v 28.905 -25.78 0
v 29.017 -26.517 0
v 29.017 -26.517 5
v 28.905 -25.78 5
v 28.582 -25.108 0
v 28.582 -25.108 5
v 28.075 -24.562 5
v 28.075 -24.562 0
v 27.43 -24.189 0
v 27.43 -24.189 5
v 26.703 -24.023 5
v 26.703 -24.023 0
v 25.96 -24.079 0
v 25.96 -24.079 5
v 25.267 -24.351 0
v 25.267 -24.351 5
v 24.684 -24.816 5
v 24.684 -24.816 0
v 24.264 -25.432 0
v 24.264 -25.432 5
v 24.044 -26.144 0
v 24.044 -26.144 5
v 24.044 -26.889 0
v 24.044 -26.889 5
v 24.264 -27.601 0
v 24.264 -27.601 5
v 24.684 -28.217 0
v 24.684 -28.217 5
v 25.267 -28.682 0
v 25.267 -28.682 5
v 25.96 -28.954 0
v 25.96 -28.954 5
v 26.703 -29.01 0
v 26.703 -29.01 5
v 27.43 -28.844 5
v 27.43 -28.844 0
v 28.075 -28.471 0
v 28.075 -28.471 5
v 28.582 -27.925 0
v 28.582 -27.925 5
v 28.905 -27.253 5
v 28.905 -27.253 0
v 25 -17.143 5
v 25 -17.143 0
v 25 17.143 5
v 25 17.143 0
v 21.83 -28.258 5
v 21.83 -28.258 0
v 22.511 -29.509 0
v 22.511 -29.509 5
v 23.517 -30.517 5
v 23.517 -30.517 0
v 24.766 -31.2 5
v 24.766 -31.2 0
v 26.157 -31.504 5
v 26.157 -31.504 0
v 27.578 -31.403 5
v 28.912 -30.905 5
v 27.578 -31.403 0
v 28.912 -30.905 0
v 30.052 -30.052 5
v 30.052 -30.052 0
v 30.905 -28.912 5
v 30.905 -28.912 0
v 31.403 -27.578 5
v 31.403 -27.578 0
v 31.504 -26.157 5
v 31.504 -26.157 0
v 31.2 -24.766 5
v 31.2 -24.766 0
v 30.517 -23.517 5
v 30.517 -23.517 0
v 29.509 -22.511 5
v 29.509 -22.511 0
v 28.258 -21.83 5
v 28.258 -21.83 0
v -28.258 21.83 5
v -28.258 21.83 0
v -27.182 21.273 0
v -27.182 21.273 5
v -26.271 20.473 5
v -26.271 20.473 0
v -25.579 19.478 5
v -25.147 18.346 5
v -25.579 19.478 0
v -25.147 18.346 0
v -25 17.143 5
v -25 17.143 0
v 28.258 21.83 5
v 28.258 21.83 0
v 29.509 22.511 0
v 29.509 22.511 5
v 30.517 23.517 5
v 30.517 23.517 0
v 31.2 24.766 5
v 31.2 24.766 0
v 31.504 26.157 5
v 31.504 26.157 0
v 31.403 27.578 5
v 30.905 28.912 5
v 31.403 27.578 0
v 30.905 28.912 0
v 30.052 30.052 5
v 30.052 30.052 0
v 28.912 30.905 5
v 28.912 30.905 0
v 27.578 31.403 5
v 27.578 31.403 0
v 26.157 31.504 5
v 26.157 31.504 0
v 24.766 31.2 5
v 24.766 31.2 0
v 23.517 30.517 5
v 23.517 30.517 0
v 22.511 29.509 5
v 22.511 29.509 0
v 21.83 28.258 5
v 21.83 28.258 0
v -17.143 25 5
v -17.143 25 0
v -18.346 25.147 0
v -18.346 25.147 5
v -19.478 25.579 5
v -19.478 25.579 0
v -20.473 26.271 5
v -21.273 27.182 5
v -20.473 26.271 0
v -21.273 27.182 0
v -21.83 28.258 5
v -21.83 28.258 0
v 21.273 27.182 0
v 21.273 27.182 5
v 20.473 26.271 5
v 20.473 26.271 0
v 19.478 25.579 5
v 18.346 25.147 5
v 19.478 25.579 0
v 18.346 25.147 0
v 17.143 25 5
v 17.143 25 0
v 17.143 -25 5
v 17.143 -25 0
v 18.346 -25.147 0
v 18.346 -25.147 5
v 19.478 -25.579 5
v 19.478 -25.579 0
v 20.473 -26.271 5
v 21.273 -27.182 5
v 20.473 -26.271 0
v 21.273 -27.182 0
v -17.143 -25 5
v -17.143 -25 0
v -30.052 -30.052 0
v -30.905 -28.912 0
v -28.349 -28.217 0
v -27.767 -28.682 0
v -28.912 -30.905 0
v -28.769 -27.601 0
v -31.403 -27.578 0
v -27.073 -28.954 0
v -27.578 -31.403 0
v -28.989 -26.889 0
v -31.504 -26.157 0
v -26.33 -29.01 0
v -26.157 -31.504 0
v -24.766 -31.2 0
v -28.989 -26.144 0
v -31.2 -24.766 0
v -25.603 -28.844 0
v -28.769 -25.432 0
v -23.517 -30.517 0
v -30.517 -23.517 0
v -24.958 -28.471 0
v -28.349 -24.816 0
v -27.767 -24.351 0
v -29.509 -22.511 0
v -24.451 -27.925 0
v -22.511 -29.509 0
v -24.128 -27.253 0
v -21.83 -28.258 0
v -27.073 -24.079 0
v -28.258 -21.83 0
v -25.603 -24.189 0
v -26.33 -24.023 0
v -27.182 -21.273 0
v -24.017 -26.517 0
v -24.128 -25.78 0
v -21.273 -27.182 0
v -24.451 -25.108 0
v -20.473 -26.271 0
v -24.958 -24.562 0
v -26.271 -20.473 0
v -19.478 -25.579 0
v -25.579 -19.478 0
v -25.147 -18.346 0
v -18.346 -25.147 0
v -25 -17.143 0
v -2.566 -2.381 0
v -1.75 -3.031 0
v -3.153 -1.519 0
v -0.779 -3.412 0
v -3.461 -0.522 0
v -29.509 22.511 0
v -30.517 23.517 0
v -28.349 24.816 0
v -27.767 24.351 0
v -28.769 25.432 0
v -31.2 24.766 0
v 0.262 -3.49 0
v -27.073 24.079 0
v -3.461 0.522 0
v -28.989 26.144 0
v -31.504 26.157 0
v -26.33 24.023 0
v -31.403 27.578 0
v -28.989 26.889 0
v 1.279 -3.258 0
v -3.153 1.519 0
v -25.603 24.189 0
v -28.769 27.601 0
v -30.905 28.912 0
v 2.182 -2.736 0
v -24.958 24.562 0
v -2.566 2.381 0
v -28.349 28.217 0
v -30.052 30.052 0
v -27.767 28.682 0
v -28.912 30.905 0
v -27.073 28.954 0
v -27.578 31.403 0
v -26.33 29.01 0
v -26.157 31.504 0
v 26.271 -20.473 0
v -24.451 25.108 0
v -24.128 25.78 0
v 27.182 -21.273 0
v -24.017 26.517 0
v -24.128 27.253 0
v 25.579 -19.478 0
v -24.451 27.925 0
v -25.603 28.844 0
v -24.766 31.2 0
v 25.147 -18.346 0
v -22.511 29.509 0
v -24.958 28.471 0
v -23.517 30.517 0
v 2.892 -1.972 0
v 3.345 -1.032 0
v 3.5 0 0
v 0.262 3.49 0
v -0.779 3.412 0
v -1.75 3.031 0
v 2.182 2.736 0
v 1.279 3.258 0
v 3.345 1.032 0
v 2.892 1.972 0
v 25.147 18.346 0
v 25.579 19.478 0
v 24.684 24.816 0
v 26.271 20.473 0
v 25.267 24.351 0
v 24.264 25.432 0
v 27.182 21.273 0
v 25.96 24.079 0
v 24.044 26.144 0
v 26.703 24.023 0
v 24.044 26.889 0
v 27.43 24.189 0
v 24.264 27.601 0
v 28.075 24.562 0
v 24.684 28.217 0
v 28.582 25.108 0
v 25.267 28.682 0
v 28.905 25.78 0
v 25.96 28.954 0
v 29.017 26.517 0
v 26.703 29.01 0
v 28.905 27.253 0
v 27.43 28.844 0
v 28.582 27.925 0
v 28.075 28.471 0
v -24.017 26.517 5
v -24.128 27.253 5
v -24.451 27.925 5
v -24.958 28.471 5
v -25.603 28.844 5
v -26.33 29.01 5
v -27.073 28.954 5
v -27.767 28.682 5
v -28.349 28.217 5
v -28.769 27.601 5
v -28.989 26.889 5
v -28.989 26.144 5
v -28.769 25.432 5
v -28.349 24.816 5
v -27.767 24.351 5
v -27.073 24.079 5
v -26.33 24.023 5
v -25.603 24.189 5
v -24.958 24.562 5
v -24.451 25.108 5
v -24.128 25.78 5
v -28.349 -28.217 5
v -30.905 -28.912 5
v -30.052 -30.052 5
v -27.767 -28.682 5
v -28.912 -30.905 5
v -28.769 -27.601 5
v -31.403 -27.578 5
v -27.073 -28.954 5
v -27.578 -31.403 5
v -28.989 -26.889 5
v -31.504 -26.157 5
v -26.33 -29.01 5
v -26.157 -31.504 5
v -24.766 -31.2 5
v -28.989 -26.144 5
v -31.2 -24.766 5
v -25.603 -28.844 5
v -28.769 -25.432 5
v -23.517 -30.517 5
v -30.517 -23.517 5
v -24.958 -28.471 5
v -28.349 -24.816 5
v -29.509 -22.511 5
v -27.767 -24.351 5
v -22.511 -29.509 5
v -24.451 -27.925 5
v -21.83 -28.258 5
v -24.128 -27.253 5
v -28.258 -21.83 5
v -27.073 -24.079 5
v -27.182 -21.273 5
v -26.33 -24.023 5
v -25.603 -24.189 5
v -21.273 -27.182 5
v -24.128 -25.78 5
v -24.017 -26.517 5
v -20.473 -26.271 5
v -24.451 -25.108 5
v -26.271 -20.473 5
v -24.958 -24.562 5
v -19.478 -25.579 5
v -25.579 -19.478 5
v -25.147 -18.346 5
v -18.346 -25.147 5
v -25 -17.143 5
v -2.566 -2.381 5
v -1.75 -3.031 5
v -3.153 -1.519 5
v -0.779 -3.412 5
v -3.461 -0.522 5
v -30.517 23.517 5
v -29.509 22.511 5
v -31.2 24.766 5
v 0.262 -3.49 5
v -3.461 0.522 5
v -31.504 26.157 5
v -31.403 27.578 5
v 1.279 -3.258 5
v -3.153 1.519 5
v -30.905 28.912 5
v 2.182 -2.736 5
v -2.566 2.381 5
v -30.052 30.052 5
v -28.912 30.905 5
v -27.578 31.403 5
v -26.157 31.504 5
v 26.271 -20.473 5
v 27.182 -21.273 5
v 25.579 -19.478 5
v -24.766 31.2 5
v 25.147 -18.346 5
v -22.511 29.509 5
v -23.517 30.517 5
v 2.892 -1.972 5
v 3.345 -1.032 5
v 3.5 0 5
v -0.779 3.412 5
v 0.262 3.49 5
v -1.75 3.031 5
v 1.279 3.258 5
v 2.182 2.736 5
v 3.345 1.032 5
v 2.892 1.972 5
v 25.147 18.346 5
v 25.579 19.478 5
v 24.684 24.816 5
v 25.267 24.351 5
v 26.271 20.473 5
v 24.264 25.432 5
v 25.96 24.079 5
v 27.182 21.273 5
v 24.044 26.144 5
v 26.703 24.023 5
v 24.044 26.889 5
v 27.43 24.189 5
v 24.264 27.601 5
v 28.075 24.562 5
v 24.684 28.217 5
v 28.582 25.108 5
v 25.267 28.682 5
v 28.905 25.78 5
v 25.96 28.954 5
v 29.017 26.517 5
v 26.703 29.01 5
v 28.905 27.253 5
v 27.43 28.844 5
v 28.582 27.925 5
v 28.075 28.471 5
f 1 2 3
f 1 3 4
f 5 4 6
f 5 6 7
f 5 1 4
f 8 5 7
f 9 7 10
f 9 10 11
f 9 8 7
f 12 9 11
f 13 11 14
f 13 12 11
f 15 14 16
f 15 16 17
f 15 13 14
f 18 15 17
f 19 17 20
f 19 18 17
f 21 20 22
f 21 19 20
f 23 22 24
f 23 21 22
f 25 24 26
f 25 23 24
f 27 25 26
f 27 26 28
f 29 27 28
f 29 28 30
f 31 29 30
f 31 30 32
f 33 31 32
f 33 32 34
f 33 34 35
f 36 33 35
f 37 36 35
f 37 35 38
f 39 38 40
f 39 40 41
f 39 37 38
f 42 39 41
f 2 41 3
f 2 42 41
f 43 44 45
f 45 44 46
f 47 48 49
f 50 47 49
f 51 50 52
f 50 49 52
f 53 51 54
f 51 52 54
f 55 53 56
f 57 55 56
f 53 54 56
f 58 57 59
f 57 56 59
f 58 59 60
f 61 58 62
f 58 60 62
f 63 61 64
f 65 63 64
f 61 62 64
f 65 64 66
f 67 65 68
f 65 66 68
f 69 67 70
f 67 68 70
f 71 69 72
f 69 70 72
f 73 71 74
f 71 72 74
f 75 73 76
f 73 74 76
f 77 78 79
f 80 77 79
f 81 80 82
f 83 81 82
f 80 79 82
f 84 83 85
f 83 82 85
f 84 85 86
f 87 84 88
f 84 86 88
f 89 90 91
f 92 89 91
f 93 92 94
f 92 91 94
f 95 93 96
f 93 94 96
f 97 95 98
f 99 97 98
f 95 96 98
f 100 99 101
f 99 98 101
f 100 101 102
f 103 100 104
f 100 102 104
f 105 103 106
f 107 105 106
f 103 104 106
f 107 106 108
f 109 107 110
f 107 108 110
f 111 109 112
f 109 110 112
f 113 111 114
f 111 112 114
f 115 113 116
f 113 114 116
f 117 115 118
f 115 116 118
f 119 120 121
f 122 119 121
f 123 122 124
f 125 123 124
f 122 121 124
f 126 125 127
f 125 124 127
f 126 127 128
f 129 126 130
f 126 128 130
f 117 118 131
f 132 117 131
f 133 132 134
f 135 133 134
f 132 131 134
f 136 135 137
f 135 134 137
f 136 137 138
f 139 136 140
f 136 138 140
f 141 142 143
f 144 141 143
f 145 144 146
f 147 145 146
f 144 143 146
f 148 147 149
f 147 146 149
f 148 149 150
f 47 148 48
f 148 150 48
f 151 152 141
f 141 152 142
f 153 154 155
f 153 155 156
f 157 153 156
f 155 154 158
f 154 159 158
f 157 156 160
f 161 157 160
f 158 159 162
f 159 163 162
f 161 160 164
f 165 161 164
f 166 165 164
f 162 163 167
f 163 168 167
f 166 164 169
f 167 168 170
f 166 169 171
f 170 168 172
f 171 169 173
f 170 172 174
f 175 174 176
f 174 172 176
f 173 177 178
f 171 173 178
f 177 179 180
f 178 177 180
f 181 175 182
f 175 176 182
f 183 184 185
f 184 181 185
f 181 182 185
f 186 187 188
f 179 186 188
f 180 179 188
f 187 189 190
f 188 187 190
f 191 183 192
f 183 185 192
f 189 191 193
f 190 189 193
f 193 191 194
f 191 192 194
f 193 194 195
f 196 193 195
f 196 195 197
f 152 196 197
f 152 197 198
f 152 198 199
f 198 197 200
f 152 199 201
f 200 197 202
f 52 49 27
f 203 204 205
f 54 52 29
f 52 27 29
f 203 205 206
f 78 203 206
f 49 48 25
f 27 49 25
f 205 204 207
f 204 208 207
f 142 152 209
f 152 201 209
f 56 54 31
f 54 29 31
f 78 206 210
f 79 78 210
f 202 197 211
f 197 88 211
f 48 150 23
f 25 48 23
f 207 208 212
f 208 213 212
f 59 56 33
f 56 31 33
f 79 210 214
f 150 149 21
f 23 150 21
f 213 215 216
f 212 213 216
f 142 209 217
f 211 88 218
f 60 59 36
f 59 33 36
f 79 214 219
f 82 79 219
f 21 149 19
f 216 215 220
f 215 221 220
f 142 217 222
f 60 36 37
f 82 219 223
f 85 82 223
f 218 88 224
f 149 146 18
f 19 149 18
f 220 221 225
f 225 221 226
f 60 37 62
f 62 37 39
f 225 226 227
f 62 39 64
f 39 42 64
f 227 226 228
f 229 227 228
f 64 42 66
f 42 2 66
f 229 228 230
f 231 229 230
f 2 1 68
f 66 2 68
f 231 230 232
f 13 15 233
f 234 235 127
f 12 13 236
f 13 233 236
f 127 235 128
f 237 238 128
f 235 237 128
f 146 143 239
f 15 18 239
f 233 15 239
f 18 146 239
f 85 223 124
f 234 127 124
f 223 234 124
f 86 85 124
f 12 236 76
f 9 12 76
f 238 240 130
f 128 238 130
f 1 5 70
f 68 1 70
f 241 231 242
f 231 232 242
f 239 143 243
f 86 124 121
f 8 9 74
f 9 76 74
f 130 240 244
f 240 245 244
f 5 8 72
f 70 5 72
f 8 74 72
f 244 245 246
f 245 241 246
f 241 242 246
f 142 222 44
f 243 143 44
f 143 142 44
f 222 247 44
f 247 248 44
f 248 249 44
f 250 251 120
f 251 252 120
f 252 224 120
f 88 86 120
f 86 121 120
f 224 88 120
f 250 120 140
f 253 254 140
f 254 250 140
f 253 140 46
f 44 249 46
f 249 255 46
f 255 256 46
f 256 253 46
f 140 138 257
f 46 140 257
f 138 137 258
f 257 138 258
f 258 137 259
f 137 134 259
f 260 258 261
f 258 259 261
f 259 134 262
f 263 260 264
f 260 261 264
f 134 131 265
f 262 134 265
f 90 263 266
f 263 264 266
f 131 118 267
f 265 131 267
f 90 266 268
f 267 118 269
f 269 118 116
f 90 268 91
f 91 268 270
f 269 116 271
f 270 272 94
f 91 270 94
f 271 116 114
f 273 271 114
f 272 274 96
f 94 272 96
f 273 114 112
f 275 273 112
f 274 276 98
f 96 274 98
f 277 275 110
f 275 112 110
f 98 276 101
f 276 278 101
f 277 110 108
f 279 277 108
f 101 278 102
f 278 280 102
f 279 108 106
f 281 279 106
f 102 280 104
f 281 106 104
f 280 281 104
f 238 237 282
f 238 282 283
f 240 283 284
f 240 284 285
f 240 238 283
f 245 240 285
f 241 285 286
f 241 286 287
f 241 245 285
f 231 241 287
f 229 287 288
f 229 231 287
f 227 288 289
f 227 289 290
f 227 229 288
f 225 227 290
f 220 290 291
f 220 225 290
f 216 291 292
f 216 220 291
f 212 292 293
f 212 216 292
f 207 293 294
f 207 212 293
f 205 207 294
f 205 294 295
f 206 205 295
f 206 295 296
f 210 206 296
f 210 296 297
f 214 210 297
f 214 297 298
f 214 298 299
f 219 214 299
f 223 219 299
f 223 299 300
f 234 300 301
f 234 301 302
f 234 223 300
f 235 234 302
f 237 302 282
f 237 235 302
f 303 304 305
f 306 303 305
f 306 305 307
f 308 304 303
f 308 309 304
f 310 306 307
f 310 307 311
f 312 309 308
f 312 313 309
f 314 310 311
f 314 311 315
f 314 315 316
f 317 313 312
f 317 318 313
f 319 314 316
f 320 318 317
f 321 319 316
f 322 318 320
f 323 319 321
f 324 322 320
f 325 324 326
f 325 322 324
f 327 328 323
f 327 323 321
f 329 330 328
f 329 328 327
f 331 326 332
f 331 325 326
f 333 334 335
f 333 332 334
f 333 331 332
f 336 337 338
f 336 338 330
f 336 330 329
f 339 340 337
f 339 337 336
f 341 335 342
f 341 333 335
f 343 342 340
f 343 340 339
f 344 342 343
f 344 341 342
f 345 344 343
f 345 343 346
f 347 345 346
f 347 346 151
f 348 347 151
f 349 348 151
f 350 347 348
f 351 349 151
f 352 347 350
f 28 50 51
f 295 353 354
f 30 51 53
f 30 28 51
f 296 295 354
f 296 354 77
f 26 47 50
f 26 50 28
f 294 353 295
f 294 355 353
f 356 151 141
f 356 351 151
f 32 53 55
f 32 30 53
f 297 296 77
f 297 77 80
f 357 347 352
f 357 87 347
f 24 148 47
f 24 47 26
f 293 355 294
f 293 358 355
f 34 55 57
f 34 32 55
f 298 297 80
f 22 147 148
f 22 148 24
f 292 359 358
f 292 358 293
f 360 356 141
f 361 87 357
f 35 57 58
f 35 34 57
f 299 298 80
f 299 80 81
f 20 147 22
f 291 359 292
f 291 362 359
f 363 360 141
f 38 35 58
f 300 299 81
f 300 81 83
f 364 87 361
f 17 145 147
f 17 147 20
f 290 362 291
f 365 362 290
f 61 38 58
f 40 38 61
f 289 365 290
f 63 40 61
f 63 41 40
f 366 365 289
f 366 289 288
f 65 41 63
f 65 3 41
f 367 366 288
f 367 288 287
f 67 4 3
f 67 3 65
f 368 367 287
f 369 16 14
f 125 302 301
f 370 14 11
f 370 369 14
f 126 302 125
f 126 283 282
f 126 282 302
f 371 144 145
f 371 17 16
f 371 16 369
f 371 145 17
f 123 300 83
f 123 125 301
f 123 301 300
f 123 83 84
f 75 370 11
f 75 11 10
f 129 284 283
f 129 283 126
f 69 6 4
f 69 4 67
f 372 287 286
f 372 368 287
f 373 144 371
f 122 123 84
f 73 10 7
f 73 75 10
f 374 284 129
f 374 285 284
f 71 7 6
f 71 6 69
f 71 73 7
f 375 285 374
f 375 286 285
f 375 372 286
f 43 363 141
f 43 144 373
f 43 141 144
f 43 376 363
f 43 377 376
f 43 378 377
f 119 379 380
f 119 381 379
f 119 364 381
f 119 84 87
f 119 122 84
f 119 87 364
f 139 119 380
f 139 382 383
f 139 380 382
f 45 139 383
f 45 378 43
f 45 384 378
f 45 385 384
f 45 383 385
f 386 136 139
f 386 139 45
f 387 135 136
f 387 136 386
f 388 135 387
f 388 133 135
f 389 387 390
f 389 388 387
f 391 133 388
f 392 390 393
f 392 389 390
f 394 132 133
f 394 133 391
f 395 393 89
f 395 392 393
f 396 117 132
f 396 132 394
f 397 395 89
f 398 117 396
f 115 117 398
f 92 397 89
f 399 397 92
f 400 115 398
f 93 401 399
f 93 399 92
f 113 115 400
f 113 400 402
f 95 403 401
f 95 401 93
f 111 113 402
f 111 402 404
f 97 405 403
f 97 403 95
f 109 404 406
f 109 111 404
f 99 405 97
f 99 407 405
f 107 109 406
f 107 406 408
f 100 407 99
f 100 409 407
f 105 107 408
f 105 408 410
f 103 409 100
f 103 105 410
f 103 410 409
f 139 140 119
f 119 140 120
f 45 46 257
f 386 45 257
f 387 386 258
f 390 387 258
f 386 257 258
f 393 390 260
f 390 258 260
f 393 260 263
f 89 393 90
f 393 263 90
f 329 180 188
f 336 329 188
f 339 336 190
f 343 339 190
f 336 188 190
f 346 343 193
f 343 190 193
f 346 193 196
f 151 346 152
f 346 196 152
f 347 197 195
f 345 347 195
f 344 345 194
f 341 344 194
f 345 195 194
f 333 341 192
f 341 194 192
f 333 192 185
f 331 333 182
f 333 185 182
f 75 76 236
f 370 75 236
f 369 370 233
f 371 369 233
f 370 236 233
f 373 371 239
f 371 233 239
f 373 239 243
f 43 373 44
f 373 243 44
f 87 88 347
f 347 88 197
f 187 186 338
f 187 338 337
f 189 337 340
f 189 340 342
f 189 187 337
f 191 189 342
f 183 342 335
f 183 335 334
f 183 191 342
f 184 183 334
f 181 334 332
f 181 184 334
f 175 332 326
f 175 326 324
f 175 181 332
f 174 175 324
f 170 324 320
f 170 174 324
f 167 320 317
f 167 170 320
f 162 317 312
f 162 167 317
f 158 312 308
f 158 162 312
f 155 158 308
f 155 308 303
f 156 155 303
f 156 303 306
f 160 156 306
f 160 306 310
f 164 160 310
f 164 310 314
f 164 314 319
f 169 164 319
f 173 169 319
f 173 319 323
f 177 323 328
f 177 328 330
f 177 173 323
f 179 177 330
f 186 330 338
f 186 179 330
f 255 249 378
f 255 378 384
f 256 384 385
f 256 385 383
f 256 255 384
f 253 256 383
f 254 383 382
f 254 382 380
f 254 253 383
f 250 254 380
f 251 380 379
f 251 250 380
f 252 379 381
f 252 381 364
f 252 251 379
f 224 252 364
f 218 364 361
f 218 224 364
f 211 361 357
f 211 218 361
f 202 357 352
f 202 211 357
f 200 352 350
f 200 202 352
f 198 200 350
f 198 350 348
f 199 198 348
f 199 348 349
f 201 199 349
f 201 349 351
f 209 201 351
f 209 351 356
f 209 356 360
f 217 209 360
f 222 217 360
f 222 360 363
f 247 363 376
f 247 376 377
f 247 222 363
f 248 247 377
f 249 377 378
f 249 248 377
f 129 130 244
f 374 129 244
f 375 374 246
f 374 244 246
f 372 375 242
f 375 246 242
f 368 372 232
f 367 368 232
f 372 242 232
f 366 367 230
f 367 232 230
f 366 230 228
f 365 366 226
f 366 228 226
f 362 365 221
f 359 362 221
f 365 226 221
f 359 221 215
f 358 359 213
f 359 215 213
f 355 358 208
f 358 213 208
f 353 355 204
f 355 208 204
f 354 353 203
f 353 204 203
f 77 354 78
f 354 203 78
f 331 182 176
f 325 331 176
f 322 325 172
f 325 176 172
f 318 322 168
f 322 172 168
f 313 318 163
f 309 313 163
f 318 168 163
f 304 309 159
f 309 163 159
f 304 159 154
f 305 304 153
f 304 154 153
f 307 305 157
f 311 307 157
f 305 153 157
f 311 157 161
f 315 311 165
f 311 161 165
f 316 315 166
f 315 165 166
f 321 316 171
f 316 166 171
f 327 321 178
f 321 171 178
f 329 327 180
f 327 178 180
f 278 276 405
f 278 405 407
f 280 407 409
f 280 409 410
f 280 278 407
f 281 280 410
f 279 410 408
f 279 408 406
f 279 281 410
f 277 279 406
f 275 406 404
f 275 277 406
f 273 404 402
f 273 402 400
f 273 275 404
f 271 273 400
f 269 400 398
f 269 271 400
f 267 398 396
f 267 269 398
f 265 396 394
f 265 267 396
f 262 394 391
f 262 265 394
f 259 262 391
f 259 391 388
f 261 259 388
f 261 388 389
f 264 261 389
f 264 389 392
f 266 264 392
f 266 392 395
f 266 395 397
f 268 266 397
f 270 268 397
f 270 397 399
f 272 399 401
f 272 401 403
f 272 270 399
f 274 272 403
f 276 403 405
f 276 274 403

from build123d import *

# Parameters (mm, degrees)
SKETCH_1_R      = 3.5
SKETCH_1_R_2    = 2.5
EXTRUDE_1_DEPTH = 5


with BuildPart() as part:
    # Эскиз1 → Бобышка-Вытянуть1 (new body)
    with BuildSketch(Plane.XY):
        with BuildLine():
            Line((-17.142857316, -25), (17.142857316, -25))
            ThreePointArc((17.142857316, -25), (19.996912391, -25.894592635), (21.829680805, -28.258252147))
            ThreePointArc((21.829680805, -28.258252147), (30.0520382, -30.0520382), (28.258252147, -21.829680805))
            ThreePointArc((28.258252147, -21.829680805), (25.894592635, -19.996912391), (25, -17.142857316))
            Line((25, -17.142857316), (25, 17.142857316))
            ThreePointArc((25, 17.142857316), (25.894592635, 19.996912391), (28.258252147, 21.829680805))
            ThreePointArc((28.258252147, 21.829680805), (30.0520382, 30.0520382), (21.829680805, 28.258252147))
            ThreePointArc((21.829680805, 28.258252147), (19.996912391, 25.894592635), (17.142857316, 25))
            Line((17.142857316, 25), (-17.142857316, 25))
            ThreePointArc((-17.142857316, 25), (-19.996912391, 25.894592635), (-21.829680805, 28.258252147))
            ThreePointArc((-21.829680805, 28.258252147), (-30.0520382, 30.0520382), (-28.258252147, 21.829680805))
            ThreePointArc((-28.258252147, 21.829680805), (-25.894592635, 19.996912391), (-25, 17.142857316))
            Line((-25, 17.142857316), (-25, -17.142857316))
            ThreePointArc((-25, -17.142857316), (-25.894592635, -19.996912391), (-28.258252147, -21.829680805))
            ThreePointArc((-28.258252147, -21.829680805), (-30.0520382, -30.0520382), (-21.829680805, -28.258252147))
            ThreePointArc((-21.829680805, -28.258252147), (-19.996912391, -25.894592635), (-17.142857316, -25))
        make_face()
        Circle(SKETCH_1_R, mode=Mode.SUBTRACT)
        with Locations((-26.516504294, 26.516504295)):
            Circle(SKETCH_1_R_2, mode=Mode.SUBTRACT)
        with Locations((26.516504295, 26.516504294)):
            Circle(SKETCH_1_R_2, mode=Mode.SUBTRACT)
        with Locations((26.516504294, -26.516504295)):
            Circle(SKETCH_1_R_2, mode=Mode.SUBTRACT)
        with Locations((-26.516504295, -26.516504294)):
            Circle(SKETCH_1_R_2, mode=Mode.SUBTRACT)
    extrude(amount=EXTRUDE_1_DEPTH)


solid = part.part
